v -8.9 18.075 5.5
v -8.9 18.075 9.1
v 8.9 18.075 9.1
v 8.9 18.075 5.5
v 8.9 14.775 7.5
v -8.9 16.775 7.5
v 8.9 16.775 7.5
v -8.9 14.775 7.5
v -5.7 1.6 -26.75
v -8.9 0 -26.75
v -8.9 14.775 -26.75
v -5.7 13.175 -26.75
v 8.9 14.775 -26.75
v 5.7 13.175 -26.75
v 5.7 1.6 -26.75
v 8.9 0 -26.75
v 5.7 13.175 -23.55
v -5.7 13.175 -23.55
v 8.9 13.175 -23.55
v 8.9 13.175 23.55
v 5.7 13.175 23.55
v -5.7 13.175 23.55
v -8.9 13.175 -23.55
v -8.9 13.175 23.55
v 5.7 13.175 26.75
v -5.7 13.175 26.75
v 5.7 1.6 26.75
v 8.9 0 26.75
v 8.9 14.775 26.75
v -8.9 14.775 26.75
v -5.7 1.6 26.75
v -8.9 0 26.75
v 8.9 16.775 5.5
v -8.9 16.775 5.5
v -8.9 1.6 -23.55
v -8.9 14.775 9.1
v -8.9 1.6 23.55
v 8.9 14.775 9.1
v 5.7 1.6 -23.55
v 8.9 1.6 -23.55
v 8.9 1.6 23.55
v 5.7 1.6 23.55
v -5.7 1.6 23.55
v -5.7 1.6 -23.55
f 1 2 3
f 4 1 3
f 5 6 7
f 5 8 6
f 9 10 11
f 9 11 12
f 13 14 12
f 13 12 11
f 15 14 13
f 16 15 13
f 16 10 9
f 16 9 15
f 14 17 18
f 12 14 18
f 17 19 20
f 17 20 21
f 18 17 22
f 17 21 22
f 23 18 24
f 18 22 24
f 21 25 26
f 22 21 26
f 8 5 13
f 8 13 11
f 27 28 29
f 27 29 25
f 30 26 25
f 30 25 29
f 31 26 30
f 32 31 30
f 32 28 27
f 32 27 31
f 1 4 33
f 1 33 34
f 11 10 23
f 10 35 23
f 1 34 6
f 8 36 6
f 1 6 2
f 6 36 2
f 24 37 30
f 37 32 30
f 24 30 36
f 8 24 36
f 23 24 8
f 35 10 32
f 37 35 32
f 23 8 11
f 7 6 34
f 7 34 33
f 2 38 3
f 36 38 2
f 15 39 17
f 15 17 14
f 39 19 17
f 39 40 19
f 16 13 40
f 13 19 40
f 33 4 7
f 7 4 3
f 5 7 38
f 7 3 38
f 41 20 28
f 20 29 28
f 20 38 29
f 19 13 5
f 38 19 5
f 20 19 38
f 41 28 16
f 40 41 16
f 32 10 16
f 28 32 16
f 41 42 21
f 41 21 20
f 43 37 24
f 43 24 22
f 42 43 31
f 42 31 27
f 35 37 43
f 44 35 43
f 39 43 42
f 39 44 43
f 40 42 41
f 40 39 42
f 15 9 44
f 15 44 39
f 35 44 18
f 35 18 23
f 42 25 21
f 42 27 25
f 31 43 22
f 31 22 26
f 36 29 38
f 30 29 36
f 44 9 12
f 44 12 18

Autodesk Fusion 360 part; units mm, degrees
sketch "Sketch1" plane through (0, 0, 0) normal (0, 1, 0) x (1, 0, 0)
  line L0 (-8.9, 26.75) -> (8.9, 26.75)
  line L1 (8.9, 26.75) -> (8.9, -26.75)
  line L2 (8.9, -26.75) -> (-8.9, -26.75)
  line L3 (-8.9, -26.75) -> (-8.9, 26.75)
  line L4 (-8.9, 26.75) -> (8.9, -26.75) construction
  line L5 (8.9, 26.75) -> (-8.9, -26.75) construction
  dimension "d1" = 17.8
  dimension "d2" = 53.5
extrude "Extrude4" add sketch "Sketch1" along normal blind 1.6 makes body 1
extrude "Extrude1" add sketch "Sketch1" along normal blind 1.6 separate body makes body 2
sketch "Sketch2" plane through (0, 1.6, 0) normal (0, 1, 0) x (-1, 0, 0)
  line L0 (8.9, 26.75) -> (-8.9, 26.75)
  line L1 (-8.9, 26.75) -> (-8.9, -26.75)
  line L2 (-8.9, -26.75) -> (8.9, -26.75)
  line L3 (8.9, -26.75) -> (8.9, 26.75)
  line L4 (8.9, -26.75) -> (5.7, -26.75)
  line L5 (5.7, -26.75) -> (5.7, -23.55)
  line L6 (5.7, -23.55) -> (8.9, -23.55)
  line L7 (8.9, -23.55) -> (8.9, -26.75)
  line L8 (-5.65, -26.75) -> (-8.85, -26.75)
  line L9 (-8.85, -26.75) -> (-8.85, -23.55)
  line L10 (-8.85, -23.55) -> (-5.65, -23.55)
  line L11 (-5.65, -23.55) -> (-5.65, -26.75)
  line L12 (8.9, 24.05) -> (5.7, 24.05)
  line L13 (5.7, 24.05) -> (5.7, 27.25)
  line L14 (5.7, 27.25) -> (8.9, 27.25)
  line L15 (8.9, 27.25) -> (8.9, 24.05)
  line L16 (-5.65, 24.05) -> (-8.85, 24.05)
  line L17 (-8.85, 24.05) -> (-8.85, 27.25)
  line L18 (-8.85, 27.25) -> (-5.65, 27.25)
  line L19 (-5.65, 27.25) -> (-5.65, 24.05)
  point P0 (-5.65, -26.75)
  point P1 (8.9, 24.05)
  point P2 (-5.65, 24.05)
  dimension "d7" = 3.2
  dimension "d8" = 3.2
  dimension "d11" = -14.55
  dimension "d12" = 50.8
  dimension "d13" = 38.8
sketch "Sketch4" plane through (0, 1.6, 0) normal (0, 1, 0) x (-1, 0, 0)
  line L0 (8.9, 26.75) -> (-8.9, 26.75)
  line L1 (-8.9, 26.75) -> (-8.9, -26.75)
  line L2 (-8.9, -26.75) -> (8.9, -26.75)
  line L3 (8.9, -26.75) -> (8.9, 26.75)
  line L4 (8.9, -26.75) -> (5.7, -26.75)
  line L5 (5.7, -26.75) -> (5.7, -23.55)
  line L6 (5.7, -23.55) -> (8.9, -23.55)
  line L7 (8.9, -23.55) -> (8.9, -26.75)
  line L8 (-8.9, -26.75) -> (-8.9, -23.55)
  line L9 (-8.9, -23.55) -> (-5.7, -23.55)
  line L10 (-5.7, -26.75) -> (-8.9, -26.75)
  line L11 (-5.7, -23.55) -> (-5.7, -26.75)
  line L12 (5.7, 23.55) -> (5.7, 26.75)
  line L13 (5.7, 26.75) -> (8.9, 26.75)
  line L14 (8.9, 23.55) -> (5.7, 23.55)
  line L15 (8.9, 26.75) -> (8.9, 23.55)
  line L16 (-8.9, 23.55) -> (-8.9, 26.75)
  line L17 (-8.9, 26.75) -> (-5.7, 26.75)
  line L18 (-5.7, 23.55) -> (-8.9, 23.55)
  line L19 (-5.7, 26.75) -> (-5.7, 23.55)
  point P0 (8.9, -26.75)
  point P1 (-5.7, -26.75)
  point P2 (-5.7, -26.75)
  point P3 (8.9, 23.55)
  point P4 (8.9, 23.55)
  point P5 (-5.7, 23.55)
  point P6 (-5.7, 23.55)
  dimension "d24" = 3.2
  dimension "d25" = 3.2
  dimension "d28" = -14.6
  dimension "d29" = 50.3
extrude "Extrude5" add sketch "Sketch4" along normal blind 11.575 contours L0 L3 L12 L13 L14 L15 | L0 L1 L16 L17 L18 L19 | L2 L3 L4 L5 L6 L7 | L1 L2 L8 L9 L10 L11 bodies 1 2
sketch "Sketch5" plane through (0, 13.175, 0) normal (0, 1, 0) x (-1, 0, 0)
  line L0 (8.9, -23.55) -> (5.7, -23.55)
  line L1 (5.7, -23.55) -> (5.7, -26.75)
  line L2 (5.7, -26.75) -> (8.9, -26.75)
  line L3 (8.9, -26.75) -> (8.9, -23.55)
  line L4 (8.9, -26.75) -> (-8.9, -26.75)
  line L5 (-8.9, -26.75) -> (-8.9, 26.75)
  line L6 (-8.9, 26.75) -> (8.9, 26.75)
  line L7 (8.9, 26.75) -> (8.9, -26.75)
  point P0 (-8.9, 26.75)
extrude "Extrude6" add sketch "Sketch5" along normal blind 1.6 bodies 1
sketch "Sketch6" plane through (0, 14.775, 0) normal (0, 1, 0) x (-1, 0, 0)
  line L0 (8.9, 26.75) -> (-8.9, 26.75)
  line L1 (-8.9, 26.75) -> (-8.9, -26.75)
  line L2 (-8.9, -26.75) -> (8.9, -26.75)
  line L3 (8.9, -26.75) -> (8.9, 26.75)
  line L4 (8.9, 7.5) -> (-8.9, 7.5)
  line L5 (-8.9, 7.5) -> (-8.9, 9.1)
  line L6 (-8.9, 9.1) -> (8.9, 9.1)
  line L7 (8.9, 9.1) -> (8.9, 7.5)
  line L8 (8.9, -26.75) -> (-8.9, -26.75)
  dimension "d34" = 1.6
  dimension "d35" = 34.25
extrude "Extrude7" add sketch "Sketch6" along normal blind 3.3 contours L1 L3 L4 L5 L6 L7 bodies 1
sketch "Sketch7" plane through (0, 0, 7.5) normal (0, 0, -1) x (-1, 0, 0)
  line L0 (-8.9, 14.775) -> (8.9, 14.775)
  line L1 (8.9, 14.775) -> (8.9, 18.075)
  line L2 (8.9, 18.075) -> (-8.9, 18.075)
  line L3 (-8.9, 18.075) -> (-8.9, 14.775)
  line L4 (-8.9, 18.075) -> (8.9, 18.075)
  line L5 (8.9, 18.075) -> (8.9, 16.775)
  line L6 (8.9, 16.775) -> (-8.9, 16.775)
  line L7 (-8.9, 16.775) -> (-8.9, 18.075)
  dimension "d38" = 1.3
extrude "Extrude8" add sketch "Sketch7" along normal blind 2 contours L1 L2 L3 L4 L5 L6 L7 bodies 1
equation "d1 = boxWidth"
equation "d11 = -17.75 mm + 3.2 mm"
equation "d12 = 54 mm - 3.2 mm"
equation "BoxLength = 53.5 mm"
equation "boxWidth = 17.8 mm"
equation "d28 = -17.8 mm + 3.2 mm"
equation "d29 = 53.5 mm - 3.2 mm"
equation "d30 = 14.075 mm - 2.5 mm"
